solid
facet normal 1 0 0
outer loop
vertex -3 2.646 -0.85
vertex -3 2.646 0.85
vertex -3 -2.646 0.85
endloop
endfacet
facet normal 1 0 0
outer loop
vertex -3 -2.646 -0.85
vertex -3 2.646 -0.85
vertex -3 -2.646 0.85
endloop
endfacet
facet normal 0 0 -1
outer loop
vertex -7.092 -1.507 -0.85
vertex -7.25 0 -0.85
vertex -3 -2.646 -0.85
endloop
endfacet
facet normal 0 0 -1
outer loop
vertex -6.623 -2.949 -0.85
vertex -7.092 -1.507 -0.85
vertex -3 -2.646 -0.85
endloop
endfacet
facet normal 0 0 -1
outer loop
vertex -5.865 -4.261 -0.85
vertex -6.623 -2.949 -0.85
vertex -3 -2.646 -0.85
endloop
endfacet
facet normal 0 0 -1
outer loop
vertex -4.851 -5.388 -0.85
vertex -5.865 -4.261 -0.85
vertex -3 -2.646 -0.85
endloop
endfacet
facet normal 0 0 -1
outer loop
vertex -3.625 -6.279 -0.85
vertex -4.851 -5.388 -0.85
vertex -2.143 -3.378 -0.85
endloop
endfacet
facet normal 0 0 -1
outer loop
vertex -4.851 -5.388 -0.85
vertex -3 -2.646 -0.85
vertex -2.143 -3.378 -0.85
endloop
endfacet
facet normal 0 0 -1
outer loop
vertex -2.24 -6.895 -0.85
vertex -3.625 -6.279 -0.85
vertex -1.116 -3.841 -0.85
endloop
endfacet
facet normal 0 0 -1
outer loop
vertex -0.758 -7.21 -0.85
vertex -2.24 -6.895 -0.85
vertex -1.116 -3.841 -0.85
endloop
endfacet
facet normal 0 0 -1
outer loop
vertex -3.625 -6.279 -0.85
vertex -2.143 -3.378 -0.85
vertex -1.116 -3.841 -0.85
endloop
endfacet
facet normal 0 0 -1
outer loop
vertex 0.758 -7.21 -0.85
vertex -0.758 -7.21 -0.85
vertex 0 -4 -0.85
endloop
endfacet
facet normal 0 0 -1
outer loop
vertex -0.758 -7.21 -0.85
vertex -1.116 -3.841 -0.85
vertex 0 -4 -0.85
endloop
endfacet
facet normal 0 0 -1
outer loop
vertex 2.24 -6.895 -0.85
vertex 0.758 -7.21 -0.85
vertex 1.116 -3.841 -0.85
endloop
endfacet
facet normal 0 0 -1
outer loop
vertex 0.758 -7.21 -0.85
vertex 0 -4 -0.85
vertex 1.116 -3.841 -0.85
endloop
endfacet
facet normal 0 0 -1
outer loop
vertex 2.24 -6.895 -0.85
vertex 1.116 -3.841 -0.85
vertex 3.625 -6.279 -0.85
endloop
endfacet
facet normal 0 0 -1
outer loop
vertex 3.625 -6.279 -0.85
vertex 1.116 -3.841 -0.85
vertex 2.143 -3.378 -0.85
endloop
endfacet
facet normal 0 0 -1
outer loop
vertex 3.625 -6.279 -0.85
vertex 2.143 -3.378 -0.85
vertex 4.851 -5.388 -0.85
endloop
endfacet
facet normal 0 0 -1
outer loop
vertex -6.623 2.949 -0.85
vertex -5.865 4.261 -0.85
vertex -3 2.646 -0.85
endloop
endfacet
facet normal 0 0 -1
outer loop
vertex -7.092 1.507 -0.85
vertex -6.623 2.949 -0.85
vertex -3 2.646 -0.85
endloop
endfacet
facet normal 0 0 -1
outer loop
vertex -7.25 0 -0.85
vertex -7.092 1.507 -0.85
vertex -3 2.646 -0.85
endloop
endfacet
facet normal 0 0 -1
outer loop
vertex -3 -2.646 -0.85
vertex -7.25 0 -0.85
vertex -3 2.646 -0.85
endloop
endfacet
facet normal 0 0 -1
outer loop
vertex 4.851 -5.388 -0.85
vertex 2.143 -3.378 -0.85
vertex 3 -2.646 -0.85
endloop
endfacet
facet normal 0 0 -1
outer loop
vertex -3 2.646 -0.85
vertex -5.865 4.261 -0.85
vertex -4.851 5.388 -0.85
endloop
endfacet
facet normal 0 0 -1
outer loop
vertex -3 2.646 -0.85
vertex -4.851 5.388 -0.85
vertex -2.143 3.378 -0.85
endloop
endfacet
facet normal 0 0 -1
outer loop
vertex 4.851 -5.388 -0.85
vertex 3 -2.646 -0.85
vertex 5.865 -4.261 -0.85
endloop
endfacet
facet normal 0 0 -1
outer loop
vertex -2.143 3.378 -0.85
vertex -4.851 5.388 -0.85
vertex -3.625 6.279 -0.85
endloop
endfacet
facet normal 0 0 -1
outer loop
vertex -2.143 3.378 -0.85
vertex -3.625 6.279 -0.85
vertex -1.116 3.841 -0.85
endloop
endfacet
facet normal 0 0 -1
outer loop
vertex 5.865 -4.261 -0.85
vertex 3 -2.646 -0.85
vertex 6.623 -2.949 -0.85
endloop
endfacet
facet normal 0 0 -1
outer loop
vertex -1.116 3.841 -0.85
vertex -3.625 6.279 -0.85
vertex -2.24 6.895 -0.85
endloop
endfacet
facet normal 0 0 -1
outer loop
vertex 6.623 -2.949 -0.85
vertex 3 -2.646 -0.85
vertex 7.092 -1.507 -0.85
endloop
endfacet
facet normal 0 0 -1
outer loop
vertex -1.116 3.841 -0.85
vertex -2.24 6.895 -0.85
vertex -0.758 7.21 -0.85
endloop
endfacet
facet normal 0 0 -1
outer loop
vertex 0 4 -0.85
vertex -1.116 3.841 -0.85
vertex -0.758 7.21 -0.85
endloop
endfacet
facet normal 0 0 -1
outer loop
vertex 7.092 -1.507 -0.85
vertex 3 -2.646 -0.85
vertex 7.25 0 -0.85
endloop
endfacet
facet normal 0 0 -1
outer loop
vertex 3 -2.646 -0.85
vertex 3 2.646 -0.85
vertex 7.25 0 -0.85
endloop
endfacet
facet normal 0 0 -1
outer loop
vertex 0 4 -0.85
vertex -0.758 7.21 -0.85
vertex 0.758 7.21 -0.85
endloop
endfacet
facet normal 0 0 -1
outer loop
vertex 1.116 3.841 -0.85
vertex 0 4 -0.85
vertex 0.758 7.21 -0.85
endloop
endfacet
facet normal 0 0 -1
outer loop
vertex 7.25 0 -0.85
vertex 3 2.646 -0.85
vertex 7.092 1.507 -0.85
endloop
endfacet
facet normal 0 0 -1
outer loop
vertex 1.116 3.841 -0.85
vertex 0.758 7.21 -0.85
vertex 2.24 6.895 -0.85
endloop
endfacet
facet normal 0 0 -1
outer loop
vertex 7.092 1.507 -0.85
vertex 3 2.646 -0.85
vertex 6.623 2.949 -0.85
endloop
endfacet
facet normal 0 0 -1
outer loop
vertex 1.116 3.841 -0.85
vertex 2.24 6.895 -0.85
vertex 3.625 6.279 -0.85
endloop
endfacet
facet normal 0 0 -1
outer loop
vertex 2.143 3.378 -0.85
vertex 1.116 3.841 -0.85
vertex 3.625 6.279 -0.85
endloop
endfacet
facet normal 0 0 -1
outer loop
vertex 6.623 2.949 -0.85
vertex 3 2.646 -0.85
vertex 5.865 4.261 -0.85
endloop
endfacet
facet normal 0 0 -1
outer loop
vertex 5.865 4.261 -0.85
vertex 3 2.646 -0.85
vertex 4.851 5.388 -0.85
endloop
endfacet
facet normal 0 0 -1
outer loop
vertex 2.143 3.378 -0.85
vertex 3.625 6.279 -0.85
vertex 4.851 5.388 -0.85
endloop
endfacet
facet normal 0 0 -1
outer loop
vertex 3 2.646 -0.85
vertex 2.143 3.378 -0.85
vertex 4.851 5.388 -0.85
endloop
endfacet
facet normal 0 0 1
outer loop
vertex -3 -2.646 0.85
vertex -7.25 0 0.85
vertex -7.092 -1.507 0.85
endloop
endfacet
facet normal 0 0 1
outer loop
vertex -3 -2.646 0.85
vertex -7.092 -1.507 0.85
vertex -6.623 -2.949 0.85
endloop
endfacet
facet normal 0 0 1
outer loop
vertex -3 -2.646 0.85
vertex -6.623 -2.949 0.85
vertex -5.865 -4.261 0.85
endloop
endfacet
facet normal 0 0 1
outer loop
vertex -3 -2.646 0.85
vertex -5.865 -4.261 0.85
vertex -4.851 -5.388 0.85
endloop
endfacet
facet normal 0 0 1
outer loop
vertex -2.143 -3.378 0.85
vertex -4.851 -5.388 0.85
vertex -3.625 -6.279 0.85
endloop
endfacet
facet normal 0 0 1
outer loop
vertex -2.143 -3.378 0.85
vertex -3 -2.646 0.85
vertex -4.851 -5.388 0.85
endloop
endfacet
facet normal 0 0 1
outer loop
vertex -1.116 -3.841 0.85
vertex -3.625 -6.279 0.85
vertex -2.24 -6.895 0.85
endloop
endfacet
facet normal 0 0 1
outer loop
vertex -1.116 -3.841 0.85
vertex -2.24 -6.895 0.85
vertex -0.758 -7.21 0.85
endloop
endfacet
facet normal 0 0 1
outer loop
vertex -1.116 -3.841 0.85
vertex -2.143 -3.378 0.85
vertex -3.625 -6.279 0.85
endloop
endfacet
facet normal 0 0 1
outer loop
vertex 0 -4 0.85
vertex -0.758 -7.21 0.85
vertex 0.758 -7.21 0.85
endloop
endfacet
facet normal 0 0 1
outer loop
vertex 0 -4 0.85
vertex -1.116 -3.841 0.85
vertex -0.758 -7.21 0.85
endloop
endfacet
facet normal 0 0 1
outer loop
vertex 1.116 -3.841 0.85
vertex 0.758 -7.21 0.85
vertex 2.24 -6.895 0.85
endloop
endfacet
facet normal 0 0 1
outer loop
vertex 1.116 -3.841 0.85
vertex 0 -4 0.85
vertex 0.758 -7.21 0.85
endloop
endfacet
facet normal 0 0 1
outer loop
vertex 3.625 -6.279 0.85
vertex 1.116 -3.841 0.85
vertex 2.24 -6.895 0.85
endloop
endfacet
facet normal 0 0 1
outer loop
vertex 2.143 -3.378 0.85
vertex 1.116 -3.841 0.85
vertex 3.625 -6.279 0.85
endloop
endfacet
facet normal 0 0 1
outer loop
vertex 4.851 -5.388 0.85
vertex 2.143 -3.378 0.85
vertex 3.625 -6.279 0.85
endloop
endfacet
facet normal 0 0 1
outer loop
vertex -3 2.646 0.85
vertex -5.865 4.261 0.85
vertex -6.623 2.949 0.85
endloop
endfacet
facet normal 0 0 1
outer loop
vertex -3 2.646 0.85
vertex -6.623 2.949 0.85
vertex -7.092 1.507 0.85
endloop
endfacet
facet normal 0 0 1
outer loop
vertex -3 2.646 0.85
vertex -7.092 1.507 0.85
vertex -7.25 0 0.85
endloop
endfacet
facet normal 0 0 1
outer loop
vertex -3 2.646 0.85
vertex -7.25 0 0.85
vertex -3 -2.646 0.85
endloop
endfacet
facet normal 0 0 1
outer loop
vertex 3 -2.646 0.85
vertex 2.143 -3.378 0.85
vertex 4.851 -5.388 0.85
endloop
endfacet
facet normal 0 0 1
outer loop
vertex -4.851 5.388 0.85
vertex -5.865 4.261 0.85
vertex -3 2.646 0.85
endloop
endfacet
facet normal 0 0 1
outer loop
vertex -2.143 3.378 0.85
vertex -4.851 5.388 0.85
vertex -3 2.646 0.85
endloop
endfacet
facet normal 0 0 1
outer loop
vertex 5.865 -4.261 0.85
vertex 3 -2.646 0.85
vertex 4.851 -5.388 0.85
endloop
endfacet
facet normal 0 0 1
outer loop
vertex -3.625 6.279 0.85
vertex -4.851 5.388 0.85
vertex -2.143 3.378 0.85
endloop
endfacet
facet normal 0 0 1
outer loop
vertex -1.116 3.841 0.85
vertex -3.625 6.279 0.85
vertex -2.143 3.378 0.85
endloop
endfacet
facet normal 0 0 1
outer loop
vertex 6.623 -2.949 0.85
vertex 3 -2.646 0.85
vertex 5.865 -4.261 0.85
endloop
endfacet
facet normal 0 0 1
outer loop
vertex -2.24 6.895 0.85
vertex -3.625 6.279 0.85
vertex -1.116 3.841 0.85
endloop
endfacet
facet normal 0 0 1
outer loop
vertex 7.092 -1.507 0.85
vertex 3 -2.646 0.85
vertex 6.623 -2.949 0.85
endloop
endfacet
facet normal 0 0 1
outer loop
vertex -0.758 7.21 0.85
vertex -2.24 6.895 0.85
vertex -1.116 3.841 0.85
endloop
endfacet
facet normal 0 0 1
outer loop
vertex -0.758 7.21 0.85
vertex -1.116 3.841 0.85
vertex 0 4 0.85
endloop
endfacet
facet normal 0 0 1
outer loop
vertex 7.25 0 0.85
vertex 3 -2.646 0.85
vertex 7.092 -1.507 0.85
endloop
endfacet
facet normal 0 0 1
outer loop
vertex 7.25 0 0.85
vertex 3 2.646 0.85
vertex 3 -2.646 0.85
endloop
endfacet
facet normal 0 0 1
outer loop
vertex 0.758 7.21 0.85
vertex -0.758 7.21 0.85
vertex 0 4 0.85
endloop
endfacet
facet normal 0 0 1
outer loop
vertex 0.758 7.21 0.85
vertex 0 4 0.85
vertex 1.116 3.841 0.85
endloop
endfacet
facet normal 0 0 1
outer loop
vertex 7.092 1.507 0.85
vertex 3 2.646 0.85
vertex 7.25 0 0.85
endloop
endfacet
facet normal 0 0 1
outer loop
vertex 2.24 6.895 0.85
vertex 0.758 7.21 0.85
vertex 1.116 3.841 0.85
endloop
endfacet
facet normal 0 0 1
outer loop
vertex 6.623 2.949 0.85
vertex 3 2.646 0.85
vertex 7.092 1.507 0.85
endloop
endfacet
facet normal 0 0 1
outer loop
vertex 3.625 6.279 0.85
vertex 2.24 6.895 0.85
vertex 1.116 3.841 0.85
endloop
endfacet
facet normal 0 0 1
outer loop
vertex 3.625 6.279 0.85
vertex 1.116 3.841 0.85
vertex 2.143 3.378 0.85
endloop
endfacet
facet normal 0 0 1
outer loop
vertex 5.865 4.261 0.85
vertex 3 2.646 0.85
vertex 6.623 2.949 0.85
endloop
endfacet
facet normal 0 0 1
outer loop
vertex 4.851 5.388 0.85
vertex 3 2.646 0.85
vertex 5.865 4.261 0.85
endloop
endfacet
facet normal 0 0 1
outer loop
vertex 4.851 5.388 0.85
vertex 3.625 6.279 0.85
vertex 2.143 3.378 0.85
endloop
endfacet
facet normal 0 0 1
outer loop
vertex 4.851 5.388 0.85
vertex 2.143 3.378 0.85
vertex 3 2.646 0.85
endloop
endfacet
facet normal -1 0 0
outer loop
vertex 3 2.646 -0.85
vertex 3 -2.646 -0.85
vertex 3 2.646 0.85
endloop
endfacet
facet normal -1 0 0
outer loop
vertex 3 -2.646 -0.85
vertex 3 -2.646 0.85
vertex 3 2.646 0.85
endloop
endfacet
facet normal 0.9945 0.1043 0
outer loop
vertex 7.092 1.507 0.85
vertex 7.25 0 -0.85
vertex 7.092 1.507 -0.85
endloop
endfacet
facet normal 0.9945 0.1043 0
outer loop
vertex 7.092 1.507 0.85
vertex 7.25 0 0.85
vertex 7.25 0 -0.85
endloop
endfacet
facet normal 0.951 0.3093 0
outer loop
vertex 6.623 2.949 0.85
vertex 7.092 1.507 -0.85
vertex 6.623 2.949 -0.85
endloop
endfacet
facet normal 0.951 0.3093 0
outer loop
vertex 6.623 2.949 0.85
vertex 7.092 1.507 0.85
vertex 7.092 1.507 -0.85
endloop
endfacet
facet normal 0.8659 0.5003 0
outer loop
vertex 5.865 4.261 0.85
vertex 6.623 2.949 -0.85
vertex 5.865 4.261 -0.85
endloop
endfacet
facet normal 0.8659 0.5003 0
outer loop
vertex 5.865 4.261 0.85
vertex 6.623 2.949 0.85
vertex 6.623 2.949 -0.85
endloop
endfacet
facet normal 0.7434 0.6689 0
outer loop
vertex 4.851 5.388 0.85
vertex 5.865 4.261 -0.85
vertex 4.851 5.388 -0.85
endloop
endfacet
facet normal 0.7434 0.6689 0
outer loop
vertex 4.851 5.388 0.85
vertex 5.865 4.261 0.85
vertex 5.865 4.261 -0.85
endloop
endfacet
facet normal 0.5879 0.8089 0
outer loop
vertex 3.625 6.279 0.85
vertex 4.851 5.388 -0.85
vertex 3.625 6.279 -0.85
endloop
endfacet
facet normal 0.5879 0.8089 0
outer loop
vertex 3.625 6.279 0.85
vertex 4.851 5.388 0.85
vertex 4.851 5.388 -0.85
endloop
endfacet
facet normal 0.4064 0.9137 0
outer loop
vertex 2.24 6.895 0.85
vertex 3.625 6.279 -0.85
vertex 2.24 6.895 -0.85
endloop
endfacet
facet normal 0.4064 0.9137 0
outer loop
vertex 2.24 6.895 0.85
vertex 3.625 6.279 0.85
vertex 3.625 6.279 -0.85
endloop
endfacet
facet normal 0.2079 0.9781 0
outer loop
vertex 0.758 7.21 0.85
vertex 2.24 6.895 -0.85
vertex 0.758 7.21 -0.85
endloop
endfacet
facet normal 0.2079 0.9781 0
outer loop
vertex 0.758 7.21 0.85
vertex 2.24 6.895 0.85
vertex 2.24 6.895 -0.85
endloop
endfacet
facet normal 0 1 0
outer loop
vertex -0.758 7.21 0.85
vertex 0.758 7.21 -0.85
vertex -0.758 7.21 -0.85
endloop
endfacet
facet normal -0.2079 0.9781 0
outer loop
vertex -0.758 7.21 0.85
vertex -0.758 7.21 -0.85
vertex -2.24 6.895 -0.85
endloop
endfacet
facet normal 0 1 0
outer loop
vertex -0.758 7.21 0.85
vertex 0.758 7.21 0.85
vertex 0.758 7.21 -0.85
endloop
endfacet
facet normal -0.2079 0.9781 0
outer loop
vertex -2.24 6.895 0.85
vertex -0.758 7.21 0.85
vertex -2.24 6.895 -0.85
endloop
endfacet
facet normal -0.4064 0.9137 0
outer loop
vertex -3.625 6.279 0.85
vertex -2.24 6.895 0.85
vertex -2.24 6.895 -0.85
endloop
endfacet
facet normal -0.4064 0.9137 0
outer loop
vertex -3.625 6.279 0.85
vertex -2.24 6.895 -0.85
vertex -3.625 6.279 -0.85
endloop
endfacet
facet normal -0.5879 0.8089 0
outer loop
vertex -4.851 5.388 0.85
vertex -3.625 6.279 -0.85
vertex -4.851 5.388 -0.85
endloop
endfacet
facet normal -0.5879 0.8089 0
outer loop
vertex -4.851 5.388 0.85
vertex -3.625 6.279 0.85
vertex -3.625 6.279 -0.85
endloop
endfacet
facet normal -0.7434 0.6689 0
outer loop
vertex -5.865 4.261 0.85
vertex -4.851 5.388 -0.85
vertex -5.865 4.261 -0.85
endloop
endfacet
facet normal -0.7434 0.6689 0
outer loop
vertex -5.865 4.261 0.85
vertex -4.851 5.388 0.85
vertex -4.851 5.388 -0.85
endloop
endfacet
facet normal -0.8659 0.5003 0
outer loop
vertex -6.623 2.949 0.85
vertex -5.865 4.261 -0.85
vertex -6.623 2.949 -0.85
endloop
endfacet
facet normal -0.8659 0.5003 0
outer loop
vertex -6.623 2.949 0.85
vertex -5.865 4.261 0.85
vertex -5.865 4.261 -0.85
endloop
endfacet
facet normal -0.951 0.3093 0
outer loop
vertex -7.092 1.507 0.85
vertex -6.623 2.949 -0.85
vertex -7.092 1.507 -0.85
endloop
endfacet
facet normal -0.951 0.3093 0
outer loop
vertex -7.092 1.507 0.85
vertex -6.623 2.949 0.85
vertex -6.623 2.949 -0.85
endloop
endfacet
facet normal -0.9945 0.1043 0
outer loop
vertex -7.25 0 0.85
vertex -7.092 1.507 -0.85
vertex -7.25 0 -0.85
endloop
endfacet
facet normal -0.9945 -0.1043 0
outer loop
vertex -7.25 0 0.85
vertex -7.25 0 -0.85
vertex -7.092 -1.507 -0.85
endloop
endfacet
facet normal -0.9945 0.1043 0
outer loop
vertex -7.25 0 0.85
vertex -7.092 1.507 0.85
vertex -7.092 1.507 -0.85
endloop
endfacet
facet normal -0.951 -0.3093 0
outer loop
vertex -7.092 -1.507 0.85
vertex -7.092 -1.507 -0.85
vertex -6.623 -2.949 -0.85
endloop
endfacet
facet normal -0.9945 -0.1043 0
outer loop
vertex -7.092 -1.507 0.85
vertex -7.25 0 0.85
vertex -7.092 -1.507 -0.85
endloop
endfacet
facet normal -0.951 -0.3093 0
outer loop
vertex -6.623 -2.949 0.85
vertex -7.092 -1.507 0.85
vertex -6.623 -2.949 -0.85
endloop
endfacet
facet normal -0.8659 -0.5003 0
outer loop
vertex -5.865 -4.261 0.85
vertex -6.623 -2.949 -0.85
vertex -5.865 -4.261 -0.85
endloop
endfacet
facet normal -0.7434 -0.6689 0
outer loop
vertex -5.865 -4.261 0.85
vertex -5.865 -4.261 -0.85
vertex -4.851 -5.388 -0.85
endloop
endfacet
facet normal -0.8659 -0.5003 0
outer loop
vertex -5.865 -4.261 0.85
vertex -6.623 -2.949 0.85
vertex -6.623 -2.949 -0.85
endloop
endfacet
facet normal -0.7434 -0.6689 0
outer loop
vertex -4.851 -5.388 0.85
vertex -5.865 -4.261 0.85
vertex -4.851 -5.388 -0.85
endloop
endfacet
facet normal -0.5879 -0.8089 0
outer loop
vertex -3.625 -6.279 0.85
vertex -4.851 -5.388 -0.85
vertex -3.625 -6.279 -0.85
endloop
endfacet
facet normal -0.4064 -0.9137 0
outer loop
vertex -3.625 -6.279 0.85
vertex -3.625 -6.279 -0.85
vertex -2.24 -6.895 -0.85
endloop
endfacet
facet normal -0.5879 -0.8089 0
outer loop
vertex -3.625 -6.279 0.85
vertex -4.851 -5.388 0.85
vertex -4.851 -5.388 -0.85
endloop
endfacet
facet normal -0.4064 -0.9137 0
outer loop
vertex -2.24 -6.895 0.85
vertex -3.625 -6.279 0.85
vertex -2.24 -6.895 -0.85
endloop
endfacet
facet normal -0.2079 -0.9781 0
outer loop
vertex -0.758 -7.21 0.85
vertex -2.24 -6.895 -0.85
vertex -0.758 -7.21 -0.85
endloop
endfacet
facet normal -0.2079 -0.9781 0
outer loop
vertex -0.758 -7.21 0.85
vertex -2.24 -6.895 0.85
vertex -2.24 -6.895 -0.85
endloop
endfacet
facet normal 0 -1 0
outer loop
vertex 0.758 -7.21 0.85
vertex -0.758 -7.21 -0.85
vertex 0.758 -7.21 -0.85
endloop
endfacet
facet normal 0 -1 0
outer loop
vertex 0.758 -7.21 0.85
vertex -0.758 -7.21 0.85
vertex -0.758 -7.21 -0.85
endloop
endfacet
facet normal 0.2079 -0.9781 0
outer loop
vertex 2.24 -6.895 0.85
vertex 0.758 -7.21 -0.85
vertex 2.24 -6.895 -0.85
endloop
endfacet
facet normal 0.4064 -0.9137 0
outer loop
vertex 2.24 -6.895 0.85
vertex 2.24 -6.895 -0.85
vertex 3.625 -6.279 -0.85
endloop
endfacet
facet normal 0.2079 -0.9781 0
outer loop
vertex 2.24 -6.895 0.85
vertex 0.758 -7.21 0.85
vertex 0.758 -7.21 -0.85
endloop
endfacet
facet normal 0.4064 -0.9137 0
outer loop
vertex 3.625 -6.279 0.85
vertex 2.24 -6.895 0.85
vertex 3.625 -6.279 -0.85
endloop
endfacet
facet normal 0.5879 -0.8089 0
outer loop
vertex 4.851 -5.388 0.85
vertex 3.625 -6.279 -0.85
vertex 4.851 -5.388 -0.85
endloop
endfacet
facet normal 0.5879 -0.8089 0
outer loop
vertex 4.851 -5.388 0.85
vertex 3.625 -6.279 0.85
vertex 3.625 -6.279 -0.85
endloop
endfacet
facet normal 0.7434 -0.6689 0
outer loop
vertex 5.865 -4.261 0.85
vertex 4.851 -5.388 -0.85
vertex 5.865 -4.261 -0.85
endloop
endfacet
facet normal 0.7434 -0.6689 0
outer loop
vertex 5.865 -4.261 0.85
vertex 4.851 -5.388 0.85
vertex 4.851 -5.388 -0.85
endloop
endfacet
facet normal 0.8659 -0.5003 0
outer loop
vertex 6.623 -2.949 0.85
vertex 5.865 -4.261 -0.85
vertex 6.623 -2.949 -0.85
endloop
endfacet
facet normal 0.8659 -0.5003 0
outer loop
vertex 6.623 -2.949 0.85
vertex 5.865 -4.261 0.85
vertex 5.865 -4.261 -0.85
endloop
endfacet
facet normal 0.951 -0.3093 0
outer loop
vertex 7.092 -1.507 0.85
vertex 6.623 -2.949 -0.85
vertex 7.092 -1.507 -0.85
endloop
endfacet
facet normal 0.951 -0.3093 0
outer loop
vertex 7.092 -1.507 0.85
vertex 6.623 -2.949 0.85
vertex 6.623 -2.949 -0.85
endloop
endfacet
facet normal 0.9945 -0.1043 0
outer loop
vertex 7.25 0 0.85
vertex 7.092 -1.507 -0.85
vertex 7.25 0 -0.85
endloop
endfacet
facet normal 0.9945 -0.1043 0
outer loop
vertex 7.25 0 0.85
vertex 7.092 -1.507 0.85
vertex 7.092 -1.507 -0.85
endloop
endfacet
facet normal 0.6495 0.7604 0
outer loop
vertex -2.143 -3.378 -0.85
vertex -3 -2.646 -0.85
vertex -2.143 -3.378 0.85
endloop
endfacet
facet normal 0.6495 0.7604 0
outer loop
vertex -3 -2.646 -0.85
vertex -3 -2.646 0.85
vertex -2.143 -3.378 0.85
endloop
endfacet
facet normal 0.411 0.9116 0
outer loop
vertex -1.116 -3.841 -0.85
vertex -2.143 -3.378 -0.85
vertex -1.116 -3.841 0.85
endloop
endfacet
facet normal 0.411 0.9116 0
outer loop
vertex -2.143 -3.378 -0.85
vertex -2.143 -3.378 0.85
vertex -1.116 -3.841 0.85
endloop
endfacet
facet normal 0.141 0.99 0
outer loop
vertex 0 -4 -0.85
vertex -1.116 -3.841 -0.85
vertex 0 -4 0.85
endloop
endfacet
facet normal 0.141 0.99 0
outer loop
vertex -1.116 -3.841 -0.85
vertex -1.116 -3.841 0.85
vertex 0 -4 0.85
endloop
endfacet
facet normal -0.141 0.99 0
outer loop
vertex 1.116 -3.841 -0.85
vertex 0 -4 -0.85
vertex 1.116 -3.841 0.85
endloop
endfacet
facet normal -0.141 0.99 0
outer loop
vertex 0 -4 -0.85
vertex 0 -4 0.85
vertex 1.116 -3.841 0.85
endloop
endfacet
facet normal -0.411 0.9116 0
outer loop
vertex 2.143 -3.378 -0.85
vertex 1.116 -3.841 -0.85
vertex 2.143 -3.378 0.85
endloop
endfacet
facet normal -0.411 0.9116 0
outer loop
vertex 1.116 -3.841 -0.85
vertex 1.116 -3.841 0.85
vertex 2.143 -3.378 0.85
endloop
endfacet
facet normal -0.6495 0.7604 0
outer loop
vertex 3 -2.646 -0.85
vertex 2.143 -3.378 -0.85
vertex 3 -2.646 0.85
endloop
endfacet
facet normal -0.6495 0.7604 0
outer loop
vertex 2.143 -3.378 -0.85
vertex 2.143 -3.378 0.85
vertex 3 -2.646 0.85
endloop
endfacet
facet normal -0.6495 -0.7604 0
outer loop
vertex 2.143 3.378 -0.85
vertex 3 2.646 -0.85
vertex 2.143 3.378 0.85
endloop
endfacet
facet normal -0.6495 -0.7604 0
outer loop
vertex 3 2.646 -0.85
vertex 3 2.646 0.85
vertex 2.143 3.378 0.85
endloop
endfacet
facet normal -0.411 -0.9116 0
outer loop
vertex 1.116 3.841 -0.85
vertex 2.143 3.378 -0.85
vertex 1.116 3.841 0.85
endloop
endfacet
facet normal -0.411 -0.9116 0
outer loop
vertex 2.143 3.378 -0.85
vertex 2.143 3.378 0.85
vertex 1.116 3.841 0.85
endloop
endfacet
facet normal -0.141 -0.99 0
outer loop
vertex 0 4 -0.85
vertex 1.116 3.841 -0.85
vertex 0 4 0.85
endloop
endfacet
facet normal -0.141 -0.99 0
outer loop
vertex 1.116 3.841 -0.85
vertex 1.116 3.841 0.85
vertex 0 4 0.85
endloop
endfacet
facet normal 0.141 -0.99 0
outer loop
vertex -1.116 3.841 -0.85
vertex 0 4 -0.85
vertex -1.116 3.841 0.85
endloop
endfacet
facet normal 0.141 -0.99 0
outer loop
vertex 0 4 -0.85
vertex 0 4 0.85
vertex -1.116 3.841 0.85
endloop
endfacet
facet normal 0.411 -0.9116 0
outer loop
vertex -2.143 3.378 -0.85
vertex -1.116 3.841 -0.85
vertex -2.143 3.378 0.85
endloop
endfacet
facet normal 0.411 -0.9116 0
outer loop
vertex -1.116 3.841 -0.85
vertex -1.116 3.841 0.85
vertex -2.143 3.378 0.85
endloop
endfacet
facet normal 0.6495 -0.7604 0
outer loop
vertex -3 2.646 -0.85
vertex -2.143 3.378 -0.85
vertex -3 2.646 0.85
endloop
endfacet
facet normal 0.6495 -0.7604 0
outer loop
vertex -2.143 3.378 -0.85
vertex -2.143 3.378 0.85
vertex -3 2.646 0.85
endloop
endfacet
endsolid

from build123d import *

# Parameters (mm, degrees)
ESQUISSE1_R      = 7.25
EXTRUSION1_DEPTH = 0.85


with BuildPart() as part:
    # Esquisse1 → Extrusion1 (new body, symmetric)
    with BuildSketch(Plane.XY):
        Circle(ESQUISSE1_R)
        with BuildLine():
            Line((-3, 2.645751311), (-3, -2.645751311))
            ThreePointArc((-3, -2.645751311), (0, -4), (3, -2.645751311))
            Line((3, -2.645751311), (3, 2.645751311))
            ThreePointArc((3, 2.645751311), (0, 4), (-3, 2.645751311))
        make_face(mode=Mode.SUBTRACT)
    extrude(amount=EXTRUSION1_DEPTH, both=True)


solid = part.part
